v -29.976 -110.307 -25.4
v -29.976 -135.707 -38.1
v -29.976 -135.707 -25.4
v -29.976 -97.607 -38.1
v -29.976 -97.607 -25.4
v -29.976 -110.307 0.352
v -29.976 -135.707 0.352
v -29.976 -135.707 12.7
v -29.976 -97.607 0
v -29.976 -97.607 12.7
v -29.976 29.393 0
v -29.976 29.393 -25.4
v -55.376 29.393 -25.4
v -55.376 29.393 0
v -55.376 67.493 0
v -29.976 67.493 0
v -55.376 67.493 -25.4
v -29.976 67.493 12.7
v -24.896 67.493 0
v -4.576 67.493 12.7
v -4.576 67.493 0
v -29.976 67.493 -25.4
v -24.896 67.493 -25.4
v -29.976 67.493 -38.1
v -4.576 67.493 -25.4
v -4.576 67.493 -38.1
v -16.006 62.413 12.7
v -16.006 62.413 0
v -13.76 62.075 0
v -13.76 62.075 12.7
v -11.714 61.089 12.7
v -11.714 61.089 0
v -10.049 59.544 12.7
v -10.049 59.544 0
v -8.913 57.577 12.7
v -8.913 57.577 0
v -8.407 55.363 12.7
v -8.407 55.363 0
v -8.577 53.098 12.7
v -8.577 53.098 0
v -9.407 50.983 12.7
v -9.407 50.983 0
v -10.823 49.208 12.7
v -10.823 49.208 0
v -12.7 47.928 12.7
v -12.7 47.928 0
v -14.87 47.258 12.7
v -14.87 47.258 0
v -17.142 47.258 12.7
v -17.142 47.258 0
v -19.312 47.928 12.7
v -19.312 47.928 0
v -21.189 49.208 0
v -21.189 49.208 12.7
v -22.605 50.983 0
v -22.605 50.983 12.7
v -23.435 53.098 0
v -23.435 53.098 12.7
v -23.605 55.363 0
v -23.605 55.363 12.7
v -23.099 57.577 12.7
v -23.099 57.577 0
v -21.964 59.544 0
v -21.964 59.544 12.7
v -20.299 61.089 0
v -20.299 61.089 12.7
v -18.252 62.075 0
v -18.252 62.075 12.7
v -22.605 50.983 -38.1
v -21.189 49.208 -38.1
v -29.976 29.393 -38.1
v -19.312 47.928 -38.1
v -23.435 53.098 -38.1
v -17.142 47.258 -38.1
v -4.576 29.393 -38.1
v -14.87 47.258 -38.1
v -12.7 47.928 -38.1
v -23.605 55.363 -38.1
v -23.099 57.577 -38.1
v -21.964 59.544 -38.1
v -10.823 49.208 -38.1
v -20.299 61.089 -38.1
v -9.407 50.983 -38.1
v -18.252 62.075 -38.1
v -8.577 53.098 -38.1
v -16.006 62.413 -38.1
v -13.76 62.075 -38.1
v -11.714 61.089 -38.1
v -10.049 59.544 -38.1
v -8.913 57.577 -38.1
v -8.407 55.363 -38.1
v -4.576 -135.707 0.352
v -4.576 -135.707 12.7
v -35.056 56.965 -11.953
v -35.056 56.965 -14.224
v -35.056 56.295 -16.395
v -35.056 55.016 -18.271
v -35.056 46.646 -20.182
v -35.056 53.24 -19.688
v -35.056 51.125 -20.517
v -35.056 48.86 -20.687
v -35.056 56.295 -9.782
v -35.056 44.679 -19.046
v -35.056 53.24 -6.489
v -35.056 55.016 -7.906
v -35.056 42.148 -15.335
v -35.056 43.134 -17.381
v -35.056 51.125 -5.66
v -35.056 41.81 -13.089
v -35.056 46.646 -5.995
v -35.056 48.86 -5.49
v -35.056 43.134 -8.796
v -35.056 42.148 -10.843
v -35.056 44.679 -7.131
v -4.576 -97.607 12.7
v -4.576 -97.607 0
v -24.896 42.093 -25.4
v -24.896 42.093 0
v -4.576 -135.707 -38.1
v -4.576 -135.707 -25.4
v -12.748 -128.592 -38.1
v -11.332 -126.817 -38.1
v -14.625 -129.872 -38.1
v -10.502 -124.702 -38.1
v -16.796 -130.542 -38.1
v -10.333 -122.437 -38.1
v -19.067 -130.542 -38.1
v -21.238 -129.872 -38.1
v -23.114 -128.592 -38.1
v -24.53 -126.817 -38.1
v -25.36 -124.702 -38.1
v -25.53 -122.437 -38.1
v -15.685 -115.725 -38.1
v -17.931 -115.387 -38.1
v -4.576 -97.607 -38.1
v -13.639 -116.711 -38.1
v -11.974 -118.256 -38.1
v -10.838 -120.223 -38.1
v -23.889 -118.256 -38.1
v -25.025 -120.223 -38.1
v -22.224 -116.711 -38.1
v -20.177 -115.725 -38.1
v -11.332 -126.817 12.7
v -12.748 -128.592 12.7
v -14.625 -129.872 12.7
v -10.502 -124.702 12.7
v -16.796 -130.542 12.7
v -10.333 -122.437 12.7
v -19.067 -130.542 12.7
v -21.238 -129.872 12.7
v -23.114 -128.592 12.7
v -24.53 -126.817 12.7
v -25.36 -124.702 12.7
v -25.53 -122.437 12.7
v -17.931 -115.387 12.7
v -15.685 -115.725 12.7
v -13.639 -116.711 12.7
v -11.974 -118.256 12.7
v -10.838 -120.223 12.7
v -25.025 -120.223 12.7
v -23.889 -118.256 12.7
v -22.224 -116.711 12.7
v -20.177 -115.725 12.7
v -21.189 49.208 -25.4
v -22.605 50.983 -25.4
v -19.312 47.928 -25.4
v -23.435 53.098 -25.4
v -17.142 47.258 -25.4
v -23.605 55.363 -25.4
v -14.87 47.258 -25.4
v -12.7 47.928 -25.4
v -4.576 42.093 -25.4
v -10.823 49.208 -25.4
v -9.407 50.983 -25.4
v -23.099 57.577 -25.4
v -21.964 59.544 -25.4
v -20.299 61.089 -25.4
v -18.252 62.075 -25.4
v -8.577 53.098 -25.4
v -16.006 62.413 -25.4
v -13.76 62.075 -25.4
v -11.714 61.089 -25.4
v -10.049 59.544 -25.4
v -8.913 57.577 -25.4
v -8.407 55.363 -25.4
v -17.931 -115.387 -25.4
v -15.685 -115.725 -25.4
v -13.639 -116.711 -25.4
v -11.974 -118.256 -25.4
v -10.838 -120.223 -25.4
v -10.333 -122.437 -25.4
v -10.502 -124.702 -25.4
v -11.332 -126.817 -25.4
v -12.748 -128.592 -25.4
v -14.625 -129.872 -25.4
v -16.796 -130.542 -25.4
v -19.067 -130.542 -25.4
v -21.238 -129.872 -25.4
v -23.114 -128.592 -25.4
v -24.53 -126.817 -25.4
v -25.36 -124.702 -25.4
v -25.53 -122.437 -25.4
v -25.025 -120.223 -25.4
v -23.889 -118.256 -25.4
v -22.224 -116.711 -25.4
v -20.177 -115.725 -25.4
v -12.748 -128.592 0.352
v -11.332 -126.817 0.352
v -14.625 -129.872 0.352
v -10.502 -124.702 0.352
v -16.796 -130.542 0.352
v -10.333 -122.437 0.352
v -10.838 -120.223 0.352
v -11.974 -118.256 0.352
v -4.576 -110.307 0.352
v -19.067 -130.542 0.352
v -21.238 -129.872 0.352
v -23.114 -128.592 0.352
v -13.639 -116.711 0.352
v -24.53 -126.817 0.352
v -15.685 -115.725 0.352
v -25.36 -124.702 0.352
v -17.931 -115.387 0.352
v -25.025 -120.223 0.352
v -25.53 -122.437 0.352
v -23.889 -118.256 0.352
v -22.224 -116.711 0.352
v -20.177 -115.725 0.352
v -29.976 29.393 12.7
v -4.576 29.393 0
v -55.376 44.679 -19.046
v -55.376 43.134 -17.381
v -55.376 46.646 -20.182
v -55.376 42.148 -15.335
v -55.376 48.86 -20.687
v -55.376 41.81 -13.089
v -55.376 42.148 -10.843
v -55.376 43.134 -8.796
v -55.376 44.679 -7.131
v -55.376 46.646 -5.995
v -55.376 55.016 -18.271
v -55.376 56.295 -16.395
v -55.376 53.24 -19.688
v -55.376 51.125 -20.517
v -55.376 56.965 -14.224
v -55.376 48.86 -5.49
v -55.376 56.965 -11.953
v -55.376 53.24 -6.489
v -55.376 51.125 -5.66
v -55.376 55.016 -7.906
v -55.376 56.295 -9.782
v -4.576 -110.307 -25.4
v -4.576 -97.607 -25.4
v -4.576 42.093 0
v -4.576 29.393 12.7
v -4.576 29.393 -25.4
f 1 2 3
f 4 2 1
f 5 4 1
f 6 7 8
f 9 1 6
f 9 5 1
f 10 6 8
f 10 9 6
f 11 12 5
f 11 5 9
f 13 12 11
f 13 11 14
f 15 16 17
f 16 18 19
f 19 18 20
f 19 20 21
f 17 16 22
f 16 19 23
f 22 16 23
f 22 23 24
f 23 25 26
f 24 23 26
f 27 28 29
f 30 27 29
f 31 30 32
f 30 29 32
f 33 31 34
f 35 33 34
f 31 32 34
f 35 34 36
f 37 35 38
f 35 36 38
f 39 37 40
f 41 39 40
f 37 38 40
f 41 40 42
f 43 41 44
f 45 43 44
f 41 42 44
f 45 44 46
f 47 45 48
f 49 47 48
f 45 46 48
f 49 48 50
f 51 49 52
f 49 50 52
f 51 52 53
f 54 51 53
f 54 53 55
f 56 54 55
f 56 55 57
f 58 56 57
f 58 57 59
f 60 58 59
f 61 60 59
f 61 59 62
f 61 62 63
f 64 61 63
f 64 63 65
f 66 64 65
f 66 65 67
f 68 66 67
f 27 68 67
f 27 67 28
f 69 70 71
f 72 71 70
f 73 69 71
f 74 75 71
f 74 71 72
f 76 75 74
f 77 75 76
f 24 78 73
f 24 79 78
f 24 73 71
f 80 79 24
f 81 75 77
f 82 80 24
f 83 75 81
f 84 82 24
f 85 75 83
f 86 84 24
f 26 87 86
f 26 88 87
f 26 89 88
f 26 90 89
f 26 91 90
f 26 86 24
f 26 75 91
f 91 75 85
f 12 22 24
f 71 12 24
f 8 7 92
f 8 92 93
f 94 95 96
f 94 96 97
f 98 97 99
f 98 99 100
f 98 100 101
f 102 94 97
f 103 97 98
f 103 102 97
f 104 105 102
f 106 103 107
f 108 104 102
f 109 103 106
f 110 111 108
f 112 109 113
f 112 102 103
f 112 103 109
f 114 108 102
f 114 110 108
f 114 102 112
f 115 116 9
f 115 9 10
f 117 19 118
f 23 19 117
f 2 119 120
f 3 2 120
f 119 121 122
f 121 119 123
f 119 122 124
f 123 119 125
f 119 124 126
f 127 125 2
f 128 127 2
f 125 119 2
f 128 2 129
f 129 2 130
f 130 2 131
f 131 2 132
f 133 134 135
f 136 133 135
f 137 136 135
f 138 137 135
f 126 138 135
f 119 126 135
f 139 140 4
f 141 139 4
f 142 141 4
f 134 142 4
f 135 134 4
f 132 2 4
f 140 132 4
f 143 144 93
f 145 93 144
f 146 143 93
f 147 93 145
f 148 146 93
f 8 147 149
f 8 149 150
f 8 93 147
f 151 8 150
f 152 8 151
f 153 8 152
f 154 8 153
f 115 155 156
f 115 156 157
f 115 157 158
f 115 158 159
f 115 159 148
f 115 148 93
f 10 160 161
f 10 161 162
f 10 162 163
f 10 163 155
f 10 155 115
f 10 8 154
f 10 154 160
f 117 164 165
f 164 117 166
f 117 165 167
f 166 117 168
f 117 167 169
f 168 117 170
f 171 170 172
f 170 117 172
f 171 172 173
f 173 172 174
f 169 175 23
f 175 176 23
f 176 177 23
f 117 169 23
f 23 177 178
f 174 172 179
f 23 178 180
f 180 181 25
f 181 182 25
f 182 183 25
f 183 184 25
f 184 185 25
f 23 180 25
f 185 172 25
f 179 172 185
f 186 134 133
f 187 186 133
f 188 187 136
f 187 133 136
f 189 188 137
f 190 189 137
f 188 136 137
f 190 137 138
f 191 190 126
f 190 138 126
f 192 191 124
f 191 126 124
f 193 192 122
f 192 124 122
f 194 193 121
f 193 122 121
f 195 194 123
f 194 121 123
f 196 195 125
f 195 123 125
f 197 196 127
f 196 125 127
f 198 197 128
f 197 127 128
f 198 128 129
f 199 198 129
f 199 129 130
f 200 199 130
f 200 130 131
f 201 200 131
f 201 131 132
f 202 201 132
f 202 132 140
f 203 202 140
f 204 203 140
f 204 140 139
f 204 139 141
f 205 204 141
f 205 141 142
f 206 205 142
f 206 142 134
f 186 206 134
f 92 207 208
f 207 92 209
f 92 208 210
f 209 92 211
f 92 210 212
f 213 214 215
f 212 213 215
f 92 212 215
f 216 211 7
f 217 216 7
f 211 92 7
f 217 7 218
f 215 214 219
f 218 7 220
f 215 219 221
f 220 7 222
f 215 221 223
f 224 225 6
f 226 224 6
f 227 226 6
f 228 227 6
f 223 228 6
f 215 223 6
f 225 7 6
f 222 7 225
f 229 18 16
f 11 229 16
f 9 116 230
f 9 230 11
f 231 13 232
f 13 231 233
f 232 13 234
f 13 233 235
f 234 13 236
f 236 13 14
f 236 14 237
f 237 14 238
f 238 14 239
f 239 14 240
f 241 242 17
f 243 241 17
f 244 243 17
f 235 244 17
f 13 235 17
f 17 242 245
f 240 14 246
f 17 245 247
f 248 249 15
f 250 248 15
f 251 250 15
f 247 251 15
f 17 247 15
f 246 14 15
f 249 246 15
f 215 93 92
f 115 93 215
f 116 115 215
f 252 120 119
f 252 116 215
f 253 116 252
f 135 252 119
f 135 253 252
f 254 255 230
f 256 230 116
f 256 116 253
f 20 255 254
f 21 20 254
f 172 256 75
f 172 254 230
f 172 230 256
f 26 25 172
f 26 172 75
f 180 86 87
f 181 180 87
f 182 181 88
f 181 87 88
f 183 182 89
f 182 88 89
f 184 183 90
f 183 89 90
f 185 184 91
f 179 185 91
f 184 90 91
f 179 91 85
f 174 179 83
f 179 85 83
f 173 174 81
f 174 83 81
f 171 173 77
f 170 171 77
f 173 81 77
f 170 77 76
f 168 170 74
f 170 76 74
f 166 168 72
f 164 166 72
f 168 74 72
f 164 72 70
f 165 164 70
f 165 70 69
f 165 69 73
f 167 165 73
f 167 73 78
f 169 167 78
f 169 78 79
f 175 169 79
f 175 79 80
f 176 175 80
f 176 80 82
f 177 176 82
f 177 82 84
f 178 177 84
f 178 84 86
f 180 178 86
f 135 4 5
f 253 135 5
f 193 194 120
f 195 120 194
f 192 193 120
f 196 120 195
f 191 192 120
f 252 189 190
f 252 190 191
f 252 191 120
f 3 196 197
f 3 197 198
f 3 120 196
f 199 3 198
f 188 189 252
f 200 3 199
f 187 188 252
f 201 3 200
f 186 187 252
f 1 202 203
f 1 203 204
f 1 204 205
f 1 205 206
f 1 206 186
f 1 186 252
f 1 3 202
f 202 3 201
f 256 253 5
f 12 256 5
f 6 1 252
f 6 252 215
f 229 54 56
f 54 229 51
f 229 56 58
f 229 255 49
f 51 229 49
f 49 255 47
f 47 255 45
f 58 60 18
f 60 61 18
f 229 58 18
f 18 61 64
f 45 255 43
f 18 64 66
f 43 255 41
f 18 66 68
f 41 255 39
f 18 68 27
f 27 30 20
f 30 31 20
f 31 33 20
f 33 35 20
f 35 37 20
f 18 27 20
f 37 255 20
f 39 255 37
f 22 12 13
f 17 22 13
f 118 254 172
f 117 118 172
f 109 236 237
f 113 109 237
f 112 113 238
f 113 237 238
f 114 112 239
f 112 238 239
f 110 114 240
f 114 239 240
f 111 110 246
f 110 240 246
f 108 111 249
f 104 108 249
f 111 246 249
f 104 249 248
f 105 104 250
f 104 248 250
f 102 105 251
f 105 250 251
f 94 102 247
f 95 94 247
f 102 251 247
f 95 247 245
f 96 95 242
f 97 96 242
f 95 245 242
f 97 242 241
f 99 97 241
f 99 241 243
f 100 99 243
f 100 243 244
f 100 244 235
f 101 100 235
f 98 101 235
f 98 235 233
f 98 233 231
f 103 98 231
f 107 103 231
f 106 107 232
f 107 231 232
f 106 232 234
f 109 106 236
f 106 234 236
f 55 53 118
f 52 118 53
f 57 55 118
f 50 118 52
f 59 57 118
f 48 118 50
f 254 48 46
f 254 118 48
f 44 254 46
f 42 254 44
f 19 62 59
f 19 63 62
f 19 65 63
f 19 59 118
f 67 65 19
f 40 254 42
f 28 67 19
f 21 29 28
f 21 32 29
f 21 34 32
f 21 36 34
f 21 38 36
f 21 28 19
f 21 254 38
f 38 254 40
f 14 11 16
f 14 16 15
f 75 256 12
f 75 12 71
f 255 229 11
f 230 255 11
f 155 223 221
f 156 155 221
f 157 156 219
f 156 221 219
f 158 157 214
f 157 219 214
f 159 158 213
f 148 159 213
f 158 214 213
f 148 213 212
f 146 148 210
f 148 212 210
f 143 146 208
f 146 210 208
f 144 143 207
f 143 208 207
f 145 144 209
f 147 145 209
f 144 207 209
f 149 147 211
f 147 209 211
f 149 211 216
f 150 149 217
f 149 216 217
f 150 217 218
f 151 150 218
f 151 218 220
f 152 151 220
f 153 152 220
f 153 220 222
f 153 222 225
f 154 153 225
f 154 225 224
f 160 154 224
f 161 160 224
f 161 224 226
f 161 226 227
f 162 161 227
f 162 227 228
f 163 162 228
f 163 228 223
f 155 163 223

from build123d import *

# Parameters (mm, degrees)
BASE_EXTRUDE_DEPTH  = 25.4
SKETCH7_W           = 12.7
SKETCH7_H           = 38.1
BOSS_EXTRUDE5_DEPTH = 25.4
SKETCH8_W           = 25.751736715
SKETCH8_H           = 25.4
CUT_EXTRUDE5_DEPTH  = 25.4
SKETCH11_W          = 12.7
SKETCH11_H          = 38.1
BOSS_EXTRUDE6_DEPTH = 25.4
SKETCH12_W          = 25.4
SKETCH12_H          = 25.4
CUT_EXTRUDE7_DEPTH  = 20.32
SKETCH13_R          = 7.62
CUT_EXTRUDE8_DEPTH  = 20.32
SKETCH14_R          = 7.62
CUT_EXTRUDE9_DEPTH  = 50.8


with BuildPart() as part:
    # Sketch1 → Base-Extrude (new body)
    with BuildSketch(Plane.XY):
        Polygon((-4.57611336, -135.706612686), (-29.97611336, -135.706612686), (-29.97611336, 29.393387314), (-55.37611336, 29.393387314), (-55.37611336, 67.493387314), (-29.97611336, 67.493387314), (-4.57611336, 67.493387314), align=None)
    extrude(amount=-BASE_EXTRUDE_DEPTH)

    # Sketch7 → Boss-Extrude5 (add)
    with BuildSketch(Plane.ZY.offset(29.97611336)):
        with Locations((-31.75, -116.656612686)):
            Rectangle(SKETCH7_W, SKETCH7_H)
        with Locations((6.35, -116.656612686)):
            Rectangle(SKETCH7_W, SKETCH7_H)
    extrude(amount=-BOSS_EXTRUDE5_DEPTH)

    # Sketch8 → Cut-Extrude5 (cut)
    with BuildSketch(Plane.ZY.offset(29.97611336)):
        with Locations((-12.524131643, -123.006612686)):
            Rectangle(SKETCH8_W, SKETCH8_H)
    extrude(amount=-CUT_EXTRUDE5_DEPTH, mode=Mode.SUBTRACT)

    # Sketch11 → Boss-Extrude6 (add)
    with BuildSketch(Plane(origin=(-4.57611336, 0, 0), x_dir=(0, 0, -1), z_dir=(1, 0, 0))):
        with Locations((31.75, 48.443387314)):
            Rectangle(SKETCH11_W, SKETCH11_H)
        with Locations((-6.35, 48.443387314)):
            Rectangle(SKETCH11_W, SKETCH11_H)
    extrude(amount=-BOSS_EXTRUDE6_DEPTH)

    # Sketch12 → Cut-Extrude7 (cut)
    with BuildSketch(Plane(origin=(-4.57611336, 0, 0), x_dir=(0, 0, -1), z_dir=(1, 0, 0))):
        with Locations((12.7, 54.793387314)):
            Rectangle(SKETCH12_W, SKETCH12_H)
    extrude(amount=-CUT_EXTRUDE7_DEPTH, mode=Mode.SUBTRACT)

    # Sketch13 → Cut-Extrude8 (cut)
    with BuildSketch(Plane.ZY.offset(55.37611336)):
        with Locations(Location((-13.088541232, 49.429752215, 0), (0, 0, 270))):
            Circle(SKETCH13_R)
    extrude(amount=-CUT_EXTRUDE8_DEPTH, mode=Mode.SUBTRACT)

    # Sketch14 → Cut-Extrude9 (cut)
    with BuildSketch(Plane(origin=(0, 0, -38.1), x_dir=(-1, 0, 0), z_dir=(0, 0, -1))):
        with Locations(Location((16.00611336, 54.793387314, 0), (0, 0, 90))):
            Circle(SKETCH14_R)
        with Locations(Location((17.931310165, -123.006612686, 0), (0, 0, 90))):
            Circle(SKETCH14_R)
    extrude(amount=-CUT_EXTRUDE9_DEPTH, mode=Mode.SUBTRACT)


solid = part.part
